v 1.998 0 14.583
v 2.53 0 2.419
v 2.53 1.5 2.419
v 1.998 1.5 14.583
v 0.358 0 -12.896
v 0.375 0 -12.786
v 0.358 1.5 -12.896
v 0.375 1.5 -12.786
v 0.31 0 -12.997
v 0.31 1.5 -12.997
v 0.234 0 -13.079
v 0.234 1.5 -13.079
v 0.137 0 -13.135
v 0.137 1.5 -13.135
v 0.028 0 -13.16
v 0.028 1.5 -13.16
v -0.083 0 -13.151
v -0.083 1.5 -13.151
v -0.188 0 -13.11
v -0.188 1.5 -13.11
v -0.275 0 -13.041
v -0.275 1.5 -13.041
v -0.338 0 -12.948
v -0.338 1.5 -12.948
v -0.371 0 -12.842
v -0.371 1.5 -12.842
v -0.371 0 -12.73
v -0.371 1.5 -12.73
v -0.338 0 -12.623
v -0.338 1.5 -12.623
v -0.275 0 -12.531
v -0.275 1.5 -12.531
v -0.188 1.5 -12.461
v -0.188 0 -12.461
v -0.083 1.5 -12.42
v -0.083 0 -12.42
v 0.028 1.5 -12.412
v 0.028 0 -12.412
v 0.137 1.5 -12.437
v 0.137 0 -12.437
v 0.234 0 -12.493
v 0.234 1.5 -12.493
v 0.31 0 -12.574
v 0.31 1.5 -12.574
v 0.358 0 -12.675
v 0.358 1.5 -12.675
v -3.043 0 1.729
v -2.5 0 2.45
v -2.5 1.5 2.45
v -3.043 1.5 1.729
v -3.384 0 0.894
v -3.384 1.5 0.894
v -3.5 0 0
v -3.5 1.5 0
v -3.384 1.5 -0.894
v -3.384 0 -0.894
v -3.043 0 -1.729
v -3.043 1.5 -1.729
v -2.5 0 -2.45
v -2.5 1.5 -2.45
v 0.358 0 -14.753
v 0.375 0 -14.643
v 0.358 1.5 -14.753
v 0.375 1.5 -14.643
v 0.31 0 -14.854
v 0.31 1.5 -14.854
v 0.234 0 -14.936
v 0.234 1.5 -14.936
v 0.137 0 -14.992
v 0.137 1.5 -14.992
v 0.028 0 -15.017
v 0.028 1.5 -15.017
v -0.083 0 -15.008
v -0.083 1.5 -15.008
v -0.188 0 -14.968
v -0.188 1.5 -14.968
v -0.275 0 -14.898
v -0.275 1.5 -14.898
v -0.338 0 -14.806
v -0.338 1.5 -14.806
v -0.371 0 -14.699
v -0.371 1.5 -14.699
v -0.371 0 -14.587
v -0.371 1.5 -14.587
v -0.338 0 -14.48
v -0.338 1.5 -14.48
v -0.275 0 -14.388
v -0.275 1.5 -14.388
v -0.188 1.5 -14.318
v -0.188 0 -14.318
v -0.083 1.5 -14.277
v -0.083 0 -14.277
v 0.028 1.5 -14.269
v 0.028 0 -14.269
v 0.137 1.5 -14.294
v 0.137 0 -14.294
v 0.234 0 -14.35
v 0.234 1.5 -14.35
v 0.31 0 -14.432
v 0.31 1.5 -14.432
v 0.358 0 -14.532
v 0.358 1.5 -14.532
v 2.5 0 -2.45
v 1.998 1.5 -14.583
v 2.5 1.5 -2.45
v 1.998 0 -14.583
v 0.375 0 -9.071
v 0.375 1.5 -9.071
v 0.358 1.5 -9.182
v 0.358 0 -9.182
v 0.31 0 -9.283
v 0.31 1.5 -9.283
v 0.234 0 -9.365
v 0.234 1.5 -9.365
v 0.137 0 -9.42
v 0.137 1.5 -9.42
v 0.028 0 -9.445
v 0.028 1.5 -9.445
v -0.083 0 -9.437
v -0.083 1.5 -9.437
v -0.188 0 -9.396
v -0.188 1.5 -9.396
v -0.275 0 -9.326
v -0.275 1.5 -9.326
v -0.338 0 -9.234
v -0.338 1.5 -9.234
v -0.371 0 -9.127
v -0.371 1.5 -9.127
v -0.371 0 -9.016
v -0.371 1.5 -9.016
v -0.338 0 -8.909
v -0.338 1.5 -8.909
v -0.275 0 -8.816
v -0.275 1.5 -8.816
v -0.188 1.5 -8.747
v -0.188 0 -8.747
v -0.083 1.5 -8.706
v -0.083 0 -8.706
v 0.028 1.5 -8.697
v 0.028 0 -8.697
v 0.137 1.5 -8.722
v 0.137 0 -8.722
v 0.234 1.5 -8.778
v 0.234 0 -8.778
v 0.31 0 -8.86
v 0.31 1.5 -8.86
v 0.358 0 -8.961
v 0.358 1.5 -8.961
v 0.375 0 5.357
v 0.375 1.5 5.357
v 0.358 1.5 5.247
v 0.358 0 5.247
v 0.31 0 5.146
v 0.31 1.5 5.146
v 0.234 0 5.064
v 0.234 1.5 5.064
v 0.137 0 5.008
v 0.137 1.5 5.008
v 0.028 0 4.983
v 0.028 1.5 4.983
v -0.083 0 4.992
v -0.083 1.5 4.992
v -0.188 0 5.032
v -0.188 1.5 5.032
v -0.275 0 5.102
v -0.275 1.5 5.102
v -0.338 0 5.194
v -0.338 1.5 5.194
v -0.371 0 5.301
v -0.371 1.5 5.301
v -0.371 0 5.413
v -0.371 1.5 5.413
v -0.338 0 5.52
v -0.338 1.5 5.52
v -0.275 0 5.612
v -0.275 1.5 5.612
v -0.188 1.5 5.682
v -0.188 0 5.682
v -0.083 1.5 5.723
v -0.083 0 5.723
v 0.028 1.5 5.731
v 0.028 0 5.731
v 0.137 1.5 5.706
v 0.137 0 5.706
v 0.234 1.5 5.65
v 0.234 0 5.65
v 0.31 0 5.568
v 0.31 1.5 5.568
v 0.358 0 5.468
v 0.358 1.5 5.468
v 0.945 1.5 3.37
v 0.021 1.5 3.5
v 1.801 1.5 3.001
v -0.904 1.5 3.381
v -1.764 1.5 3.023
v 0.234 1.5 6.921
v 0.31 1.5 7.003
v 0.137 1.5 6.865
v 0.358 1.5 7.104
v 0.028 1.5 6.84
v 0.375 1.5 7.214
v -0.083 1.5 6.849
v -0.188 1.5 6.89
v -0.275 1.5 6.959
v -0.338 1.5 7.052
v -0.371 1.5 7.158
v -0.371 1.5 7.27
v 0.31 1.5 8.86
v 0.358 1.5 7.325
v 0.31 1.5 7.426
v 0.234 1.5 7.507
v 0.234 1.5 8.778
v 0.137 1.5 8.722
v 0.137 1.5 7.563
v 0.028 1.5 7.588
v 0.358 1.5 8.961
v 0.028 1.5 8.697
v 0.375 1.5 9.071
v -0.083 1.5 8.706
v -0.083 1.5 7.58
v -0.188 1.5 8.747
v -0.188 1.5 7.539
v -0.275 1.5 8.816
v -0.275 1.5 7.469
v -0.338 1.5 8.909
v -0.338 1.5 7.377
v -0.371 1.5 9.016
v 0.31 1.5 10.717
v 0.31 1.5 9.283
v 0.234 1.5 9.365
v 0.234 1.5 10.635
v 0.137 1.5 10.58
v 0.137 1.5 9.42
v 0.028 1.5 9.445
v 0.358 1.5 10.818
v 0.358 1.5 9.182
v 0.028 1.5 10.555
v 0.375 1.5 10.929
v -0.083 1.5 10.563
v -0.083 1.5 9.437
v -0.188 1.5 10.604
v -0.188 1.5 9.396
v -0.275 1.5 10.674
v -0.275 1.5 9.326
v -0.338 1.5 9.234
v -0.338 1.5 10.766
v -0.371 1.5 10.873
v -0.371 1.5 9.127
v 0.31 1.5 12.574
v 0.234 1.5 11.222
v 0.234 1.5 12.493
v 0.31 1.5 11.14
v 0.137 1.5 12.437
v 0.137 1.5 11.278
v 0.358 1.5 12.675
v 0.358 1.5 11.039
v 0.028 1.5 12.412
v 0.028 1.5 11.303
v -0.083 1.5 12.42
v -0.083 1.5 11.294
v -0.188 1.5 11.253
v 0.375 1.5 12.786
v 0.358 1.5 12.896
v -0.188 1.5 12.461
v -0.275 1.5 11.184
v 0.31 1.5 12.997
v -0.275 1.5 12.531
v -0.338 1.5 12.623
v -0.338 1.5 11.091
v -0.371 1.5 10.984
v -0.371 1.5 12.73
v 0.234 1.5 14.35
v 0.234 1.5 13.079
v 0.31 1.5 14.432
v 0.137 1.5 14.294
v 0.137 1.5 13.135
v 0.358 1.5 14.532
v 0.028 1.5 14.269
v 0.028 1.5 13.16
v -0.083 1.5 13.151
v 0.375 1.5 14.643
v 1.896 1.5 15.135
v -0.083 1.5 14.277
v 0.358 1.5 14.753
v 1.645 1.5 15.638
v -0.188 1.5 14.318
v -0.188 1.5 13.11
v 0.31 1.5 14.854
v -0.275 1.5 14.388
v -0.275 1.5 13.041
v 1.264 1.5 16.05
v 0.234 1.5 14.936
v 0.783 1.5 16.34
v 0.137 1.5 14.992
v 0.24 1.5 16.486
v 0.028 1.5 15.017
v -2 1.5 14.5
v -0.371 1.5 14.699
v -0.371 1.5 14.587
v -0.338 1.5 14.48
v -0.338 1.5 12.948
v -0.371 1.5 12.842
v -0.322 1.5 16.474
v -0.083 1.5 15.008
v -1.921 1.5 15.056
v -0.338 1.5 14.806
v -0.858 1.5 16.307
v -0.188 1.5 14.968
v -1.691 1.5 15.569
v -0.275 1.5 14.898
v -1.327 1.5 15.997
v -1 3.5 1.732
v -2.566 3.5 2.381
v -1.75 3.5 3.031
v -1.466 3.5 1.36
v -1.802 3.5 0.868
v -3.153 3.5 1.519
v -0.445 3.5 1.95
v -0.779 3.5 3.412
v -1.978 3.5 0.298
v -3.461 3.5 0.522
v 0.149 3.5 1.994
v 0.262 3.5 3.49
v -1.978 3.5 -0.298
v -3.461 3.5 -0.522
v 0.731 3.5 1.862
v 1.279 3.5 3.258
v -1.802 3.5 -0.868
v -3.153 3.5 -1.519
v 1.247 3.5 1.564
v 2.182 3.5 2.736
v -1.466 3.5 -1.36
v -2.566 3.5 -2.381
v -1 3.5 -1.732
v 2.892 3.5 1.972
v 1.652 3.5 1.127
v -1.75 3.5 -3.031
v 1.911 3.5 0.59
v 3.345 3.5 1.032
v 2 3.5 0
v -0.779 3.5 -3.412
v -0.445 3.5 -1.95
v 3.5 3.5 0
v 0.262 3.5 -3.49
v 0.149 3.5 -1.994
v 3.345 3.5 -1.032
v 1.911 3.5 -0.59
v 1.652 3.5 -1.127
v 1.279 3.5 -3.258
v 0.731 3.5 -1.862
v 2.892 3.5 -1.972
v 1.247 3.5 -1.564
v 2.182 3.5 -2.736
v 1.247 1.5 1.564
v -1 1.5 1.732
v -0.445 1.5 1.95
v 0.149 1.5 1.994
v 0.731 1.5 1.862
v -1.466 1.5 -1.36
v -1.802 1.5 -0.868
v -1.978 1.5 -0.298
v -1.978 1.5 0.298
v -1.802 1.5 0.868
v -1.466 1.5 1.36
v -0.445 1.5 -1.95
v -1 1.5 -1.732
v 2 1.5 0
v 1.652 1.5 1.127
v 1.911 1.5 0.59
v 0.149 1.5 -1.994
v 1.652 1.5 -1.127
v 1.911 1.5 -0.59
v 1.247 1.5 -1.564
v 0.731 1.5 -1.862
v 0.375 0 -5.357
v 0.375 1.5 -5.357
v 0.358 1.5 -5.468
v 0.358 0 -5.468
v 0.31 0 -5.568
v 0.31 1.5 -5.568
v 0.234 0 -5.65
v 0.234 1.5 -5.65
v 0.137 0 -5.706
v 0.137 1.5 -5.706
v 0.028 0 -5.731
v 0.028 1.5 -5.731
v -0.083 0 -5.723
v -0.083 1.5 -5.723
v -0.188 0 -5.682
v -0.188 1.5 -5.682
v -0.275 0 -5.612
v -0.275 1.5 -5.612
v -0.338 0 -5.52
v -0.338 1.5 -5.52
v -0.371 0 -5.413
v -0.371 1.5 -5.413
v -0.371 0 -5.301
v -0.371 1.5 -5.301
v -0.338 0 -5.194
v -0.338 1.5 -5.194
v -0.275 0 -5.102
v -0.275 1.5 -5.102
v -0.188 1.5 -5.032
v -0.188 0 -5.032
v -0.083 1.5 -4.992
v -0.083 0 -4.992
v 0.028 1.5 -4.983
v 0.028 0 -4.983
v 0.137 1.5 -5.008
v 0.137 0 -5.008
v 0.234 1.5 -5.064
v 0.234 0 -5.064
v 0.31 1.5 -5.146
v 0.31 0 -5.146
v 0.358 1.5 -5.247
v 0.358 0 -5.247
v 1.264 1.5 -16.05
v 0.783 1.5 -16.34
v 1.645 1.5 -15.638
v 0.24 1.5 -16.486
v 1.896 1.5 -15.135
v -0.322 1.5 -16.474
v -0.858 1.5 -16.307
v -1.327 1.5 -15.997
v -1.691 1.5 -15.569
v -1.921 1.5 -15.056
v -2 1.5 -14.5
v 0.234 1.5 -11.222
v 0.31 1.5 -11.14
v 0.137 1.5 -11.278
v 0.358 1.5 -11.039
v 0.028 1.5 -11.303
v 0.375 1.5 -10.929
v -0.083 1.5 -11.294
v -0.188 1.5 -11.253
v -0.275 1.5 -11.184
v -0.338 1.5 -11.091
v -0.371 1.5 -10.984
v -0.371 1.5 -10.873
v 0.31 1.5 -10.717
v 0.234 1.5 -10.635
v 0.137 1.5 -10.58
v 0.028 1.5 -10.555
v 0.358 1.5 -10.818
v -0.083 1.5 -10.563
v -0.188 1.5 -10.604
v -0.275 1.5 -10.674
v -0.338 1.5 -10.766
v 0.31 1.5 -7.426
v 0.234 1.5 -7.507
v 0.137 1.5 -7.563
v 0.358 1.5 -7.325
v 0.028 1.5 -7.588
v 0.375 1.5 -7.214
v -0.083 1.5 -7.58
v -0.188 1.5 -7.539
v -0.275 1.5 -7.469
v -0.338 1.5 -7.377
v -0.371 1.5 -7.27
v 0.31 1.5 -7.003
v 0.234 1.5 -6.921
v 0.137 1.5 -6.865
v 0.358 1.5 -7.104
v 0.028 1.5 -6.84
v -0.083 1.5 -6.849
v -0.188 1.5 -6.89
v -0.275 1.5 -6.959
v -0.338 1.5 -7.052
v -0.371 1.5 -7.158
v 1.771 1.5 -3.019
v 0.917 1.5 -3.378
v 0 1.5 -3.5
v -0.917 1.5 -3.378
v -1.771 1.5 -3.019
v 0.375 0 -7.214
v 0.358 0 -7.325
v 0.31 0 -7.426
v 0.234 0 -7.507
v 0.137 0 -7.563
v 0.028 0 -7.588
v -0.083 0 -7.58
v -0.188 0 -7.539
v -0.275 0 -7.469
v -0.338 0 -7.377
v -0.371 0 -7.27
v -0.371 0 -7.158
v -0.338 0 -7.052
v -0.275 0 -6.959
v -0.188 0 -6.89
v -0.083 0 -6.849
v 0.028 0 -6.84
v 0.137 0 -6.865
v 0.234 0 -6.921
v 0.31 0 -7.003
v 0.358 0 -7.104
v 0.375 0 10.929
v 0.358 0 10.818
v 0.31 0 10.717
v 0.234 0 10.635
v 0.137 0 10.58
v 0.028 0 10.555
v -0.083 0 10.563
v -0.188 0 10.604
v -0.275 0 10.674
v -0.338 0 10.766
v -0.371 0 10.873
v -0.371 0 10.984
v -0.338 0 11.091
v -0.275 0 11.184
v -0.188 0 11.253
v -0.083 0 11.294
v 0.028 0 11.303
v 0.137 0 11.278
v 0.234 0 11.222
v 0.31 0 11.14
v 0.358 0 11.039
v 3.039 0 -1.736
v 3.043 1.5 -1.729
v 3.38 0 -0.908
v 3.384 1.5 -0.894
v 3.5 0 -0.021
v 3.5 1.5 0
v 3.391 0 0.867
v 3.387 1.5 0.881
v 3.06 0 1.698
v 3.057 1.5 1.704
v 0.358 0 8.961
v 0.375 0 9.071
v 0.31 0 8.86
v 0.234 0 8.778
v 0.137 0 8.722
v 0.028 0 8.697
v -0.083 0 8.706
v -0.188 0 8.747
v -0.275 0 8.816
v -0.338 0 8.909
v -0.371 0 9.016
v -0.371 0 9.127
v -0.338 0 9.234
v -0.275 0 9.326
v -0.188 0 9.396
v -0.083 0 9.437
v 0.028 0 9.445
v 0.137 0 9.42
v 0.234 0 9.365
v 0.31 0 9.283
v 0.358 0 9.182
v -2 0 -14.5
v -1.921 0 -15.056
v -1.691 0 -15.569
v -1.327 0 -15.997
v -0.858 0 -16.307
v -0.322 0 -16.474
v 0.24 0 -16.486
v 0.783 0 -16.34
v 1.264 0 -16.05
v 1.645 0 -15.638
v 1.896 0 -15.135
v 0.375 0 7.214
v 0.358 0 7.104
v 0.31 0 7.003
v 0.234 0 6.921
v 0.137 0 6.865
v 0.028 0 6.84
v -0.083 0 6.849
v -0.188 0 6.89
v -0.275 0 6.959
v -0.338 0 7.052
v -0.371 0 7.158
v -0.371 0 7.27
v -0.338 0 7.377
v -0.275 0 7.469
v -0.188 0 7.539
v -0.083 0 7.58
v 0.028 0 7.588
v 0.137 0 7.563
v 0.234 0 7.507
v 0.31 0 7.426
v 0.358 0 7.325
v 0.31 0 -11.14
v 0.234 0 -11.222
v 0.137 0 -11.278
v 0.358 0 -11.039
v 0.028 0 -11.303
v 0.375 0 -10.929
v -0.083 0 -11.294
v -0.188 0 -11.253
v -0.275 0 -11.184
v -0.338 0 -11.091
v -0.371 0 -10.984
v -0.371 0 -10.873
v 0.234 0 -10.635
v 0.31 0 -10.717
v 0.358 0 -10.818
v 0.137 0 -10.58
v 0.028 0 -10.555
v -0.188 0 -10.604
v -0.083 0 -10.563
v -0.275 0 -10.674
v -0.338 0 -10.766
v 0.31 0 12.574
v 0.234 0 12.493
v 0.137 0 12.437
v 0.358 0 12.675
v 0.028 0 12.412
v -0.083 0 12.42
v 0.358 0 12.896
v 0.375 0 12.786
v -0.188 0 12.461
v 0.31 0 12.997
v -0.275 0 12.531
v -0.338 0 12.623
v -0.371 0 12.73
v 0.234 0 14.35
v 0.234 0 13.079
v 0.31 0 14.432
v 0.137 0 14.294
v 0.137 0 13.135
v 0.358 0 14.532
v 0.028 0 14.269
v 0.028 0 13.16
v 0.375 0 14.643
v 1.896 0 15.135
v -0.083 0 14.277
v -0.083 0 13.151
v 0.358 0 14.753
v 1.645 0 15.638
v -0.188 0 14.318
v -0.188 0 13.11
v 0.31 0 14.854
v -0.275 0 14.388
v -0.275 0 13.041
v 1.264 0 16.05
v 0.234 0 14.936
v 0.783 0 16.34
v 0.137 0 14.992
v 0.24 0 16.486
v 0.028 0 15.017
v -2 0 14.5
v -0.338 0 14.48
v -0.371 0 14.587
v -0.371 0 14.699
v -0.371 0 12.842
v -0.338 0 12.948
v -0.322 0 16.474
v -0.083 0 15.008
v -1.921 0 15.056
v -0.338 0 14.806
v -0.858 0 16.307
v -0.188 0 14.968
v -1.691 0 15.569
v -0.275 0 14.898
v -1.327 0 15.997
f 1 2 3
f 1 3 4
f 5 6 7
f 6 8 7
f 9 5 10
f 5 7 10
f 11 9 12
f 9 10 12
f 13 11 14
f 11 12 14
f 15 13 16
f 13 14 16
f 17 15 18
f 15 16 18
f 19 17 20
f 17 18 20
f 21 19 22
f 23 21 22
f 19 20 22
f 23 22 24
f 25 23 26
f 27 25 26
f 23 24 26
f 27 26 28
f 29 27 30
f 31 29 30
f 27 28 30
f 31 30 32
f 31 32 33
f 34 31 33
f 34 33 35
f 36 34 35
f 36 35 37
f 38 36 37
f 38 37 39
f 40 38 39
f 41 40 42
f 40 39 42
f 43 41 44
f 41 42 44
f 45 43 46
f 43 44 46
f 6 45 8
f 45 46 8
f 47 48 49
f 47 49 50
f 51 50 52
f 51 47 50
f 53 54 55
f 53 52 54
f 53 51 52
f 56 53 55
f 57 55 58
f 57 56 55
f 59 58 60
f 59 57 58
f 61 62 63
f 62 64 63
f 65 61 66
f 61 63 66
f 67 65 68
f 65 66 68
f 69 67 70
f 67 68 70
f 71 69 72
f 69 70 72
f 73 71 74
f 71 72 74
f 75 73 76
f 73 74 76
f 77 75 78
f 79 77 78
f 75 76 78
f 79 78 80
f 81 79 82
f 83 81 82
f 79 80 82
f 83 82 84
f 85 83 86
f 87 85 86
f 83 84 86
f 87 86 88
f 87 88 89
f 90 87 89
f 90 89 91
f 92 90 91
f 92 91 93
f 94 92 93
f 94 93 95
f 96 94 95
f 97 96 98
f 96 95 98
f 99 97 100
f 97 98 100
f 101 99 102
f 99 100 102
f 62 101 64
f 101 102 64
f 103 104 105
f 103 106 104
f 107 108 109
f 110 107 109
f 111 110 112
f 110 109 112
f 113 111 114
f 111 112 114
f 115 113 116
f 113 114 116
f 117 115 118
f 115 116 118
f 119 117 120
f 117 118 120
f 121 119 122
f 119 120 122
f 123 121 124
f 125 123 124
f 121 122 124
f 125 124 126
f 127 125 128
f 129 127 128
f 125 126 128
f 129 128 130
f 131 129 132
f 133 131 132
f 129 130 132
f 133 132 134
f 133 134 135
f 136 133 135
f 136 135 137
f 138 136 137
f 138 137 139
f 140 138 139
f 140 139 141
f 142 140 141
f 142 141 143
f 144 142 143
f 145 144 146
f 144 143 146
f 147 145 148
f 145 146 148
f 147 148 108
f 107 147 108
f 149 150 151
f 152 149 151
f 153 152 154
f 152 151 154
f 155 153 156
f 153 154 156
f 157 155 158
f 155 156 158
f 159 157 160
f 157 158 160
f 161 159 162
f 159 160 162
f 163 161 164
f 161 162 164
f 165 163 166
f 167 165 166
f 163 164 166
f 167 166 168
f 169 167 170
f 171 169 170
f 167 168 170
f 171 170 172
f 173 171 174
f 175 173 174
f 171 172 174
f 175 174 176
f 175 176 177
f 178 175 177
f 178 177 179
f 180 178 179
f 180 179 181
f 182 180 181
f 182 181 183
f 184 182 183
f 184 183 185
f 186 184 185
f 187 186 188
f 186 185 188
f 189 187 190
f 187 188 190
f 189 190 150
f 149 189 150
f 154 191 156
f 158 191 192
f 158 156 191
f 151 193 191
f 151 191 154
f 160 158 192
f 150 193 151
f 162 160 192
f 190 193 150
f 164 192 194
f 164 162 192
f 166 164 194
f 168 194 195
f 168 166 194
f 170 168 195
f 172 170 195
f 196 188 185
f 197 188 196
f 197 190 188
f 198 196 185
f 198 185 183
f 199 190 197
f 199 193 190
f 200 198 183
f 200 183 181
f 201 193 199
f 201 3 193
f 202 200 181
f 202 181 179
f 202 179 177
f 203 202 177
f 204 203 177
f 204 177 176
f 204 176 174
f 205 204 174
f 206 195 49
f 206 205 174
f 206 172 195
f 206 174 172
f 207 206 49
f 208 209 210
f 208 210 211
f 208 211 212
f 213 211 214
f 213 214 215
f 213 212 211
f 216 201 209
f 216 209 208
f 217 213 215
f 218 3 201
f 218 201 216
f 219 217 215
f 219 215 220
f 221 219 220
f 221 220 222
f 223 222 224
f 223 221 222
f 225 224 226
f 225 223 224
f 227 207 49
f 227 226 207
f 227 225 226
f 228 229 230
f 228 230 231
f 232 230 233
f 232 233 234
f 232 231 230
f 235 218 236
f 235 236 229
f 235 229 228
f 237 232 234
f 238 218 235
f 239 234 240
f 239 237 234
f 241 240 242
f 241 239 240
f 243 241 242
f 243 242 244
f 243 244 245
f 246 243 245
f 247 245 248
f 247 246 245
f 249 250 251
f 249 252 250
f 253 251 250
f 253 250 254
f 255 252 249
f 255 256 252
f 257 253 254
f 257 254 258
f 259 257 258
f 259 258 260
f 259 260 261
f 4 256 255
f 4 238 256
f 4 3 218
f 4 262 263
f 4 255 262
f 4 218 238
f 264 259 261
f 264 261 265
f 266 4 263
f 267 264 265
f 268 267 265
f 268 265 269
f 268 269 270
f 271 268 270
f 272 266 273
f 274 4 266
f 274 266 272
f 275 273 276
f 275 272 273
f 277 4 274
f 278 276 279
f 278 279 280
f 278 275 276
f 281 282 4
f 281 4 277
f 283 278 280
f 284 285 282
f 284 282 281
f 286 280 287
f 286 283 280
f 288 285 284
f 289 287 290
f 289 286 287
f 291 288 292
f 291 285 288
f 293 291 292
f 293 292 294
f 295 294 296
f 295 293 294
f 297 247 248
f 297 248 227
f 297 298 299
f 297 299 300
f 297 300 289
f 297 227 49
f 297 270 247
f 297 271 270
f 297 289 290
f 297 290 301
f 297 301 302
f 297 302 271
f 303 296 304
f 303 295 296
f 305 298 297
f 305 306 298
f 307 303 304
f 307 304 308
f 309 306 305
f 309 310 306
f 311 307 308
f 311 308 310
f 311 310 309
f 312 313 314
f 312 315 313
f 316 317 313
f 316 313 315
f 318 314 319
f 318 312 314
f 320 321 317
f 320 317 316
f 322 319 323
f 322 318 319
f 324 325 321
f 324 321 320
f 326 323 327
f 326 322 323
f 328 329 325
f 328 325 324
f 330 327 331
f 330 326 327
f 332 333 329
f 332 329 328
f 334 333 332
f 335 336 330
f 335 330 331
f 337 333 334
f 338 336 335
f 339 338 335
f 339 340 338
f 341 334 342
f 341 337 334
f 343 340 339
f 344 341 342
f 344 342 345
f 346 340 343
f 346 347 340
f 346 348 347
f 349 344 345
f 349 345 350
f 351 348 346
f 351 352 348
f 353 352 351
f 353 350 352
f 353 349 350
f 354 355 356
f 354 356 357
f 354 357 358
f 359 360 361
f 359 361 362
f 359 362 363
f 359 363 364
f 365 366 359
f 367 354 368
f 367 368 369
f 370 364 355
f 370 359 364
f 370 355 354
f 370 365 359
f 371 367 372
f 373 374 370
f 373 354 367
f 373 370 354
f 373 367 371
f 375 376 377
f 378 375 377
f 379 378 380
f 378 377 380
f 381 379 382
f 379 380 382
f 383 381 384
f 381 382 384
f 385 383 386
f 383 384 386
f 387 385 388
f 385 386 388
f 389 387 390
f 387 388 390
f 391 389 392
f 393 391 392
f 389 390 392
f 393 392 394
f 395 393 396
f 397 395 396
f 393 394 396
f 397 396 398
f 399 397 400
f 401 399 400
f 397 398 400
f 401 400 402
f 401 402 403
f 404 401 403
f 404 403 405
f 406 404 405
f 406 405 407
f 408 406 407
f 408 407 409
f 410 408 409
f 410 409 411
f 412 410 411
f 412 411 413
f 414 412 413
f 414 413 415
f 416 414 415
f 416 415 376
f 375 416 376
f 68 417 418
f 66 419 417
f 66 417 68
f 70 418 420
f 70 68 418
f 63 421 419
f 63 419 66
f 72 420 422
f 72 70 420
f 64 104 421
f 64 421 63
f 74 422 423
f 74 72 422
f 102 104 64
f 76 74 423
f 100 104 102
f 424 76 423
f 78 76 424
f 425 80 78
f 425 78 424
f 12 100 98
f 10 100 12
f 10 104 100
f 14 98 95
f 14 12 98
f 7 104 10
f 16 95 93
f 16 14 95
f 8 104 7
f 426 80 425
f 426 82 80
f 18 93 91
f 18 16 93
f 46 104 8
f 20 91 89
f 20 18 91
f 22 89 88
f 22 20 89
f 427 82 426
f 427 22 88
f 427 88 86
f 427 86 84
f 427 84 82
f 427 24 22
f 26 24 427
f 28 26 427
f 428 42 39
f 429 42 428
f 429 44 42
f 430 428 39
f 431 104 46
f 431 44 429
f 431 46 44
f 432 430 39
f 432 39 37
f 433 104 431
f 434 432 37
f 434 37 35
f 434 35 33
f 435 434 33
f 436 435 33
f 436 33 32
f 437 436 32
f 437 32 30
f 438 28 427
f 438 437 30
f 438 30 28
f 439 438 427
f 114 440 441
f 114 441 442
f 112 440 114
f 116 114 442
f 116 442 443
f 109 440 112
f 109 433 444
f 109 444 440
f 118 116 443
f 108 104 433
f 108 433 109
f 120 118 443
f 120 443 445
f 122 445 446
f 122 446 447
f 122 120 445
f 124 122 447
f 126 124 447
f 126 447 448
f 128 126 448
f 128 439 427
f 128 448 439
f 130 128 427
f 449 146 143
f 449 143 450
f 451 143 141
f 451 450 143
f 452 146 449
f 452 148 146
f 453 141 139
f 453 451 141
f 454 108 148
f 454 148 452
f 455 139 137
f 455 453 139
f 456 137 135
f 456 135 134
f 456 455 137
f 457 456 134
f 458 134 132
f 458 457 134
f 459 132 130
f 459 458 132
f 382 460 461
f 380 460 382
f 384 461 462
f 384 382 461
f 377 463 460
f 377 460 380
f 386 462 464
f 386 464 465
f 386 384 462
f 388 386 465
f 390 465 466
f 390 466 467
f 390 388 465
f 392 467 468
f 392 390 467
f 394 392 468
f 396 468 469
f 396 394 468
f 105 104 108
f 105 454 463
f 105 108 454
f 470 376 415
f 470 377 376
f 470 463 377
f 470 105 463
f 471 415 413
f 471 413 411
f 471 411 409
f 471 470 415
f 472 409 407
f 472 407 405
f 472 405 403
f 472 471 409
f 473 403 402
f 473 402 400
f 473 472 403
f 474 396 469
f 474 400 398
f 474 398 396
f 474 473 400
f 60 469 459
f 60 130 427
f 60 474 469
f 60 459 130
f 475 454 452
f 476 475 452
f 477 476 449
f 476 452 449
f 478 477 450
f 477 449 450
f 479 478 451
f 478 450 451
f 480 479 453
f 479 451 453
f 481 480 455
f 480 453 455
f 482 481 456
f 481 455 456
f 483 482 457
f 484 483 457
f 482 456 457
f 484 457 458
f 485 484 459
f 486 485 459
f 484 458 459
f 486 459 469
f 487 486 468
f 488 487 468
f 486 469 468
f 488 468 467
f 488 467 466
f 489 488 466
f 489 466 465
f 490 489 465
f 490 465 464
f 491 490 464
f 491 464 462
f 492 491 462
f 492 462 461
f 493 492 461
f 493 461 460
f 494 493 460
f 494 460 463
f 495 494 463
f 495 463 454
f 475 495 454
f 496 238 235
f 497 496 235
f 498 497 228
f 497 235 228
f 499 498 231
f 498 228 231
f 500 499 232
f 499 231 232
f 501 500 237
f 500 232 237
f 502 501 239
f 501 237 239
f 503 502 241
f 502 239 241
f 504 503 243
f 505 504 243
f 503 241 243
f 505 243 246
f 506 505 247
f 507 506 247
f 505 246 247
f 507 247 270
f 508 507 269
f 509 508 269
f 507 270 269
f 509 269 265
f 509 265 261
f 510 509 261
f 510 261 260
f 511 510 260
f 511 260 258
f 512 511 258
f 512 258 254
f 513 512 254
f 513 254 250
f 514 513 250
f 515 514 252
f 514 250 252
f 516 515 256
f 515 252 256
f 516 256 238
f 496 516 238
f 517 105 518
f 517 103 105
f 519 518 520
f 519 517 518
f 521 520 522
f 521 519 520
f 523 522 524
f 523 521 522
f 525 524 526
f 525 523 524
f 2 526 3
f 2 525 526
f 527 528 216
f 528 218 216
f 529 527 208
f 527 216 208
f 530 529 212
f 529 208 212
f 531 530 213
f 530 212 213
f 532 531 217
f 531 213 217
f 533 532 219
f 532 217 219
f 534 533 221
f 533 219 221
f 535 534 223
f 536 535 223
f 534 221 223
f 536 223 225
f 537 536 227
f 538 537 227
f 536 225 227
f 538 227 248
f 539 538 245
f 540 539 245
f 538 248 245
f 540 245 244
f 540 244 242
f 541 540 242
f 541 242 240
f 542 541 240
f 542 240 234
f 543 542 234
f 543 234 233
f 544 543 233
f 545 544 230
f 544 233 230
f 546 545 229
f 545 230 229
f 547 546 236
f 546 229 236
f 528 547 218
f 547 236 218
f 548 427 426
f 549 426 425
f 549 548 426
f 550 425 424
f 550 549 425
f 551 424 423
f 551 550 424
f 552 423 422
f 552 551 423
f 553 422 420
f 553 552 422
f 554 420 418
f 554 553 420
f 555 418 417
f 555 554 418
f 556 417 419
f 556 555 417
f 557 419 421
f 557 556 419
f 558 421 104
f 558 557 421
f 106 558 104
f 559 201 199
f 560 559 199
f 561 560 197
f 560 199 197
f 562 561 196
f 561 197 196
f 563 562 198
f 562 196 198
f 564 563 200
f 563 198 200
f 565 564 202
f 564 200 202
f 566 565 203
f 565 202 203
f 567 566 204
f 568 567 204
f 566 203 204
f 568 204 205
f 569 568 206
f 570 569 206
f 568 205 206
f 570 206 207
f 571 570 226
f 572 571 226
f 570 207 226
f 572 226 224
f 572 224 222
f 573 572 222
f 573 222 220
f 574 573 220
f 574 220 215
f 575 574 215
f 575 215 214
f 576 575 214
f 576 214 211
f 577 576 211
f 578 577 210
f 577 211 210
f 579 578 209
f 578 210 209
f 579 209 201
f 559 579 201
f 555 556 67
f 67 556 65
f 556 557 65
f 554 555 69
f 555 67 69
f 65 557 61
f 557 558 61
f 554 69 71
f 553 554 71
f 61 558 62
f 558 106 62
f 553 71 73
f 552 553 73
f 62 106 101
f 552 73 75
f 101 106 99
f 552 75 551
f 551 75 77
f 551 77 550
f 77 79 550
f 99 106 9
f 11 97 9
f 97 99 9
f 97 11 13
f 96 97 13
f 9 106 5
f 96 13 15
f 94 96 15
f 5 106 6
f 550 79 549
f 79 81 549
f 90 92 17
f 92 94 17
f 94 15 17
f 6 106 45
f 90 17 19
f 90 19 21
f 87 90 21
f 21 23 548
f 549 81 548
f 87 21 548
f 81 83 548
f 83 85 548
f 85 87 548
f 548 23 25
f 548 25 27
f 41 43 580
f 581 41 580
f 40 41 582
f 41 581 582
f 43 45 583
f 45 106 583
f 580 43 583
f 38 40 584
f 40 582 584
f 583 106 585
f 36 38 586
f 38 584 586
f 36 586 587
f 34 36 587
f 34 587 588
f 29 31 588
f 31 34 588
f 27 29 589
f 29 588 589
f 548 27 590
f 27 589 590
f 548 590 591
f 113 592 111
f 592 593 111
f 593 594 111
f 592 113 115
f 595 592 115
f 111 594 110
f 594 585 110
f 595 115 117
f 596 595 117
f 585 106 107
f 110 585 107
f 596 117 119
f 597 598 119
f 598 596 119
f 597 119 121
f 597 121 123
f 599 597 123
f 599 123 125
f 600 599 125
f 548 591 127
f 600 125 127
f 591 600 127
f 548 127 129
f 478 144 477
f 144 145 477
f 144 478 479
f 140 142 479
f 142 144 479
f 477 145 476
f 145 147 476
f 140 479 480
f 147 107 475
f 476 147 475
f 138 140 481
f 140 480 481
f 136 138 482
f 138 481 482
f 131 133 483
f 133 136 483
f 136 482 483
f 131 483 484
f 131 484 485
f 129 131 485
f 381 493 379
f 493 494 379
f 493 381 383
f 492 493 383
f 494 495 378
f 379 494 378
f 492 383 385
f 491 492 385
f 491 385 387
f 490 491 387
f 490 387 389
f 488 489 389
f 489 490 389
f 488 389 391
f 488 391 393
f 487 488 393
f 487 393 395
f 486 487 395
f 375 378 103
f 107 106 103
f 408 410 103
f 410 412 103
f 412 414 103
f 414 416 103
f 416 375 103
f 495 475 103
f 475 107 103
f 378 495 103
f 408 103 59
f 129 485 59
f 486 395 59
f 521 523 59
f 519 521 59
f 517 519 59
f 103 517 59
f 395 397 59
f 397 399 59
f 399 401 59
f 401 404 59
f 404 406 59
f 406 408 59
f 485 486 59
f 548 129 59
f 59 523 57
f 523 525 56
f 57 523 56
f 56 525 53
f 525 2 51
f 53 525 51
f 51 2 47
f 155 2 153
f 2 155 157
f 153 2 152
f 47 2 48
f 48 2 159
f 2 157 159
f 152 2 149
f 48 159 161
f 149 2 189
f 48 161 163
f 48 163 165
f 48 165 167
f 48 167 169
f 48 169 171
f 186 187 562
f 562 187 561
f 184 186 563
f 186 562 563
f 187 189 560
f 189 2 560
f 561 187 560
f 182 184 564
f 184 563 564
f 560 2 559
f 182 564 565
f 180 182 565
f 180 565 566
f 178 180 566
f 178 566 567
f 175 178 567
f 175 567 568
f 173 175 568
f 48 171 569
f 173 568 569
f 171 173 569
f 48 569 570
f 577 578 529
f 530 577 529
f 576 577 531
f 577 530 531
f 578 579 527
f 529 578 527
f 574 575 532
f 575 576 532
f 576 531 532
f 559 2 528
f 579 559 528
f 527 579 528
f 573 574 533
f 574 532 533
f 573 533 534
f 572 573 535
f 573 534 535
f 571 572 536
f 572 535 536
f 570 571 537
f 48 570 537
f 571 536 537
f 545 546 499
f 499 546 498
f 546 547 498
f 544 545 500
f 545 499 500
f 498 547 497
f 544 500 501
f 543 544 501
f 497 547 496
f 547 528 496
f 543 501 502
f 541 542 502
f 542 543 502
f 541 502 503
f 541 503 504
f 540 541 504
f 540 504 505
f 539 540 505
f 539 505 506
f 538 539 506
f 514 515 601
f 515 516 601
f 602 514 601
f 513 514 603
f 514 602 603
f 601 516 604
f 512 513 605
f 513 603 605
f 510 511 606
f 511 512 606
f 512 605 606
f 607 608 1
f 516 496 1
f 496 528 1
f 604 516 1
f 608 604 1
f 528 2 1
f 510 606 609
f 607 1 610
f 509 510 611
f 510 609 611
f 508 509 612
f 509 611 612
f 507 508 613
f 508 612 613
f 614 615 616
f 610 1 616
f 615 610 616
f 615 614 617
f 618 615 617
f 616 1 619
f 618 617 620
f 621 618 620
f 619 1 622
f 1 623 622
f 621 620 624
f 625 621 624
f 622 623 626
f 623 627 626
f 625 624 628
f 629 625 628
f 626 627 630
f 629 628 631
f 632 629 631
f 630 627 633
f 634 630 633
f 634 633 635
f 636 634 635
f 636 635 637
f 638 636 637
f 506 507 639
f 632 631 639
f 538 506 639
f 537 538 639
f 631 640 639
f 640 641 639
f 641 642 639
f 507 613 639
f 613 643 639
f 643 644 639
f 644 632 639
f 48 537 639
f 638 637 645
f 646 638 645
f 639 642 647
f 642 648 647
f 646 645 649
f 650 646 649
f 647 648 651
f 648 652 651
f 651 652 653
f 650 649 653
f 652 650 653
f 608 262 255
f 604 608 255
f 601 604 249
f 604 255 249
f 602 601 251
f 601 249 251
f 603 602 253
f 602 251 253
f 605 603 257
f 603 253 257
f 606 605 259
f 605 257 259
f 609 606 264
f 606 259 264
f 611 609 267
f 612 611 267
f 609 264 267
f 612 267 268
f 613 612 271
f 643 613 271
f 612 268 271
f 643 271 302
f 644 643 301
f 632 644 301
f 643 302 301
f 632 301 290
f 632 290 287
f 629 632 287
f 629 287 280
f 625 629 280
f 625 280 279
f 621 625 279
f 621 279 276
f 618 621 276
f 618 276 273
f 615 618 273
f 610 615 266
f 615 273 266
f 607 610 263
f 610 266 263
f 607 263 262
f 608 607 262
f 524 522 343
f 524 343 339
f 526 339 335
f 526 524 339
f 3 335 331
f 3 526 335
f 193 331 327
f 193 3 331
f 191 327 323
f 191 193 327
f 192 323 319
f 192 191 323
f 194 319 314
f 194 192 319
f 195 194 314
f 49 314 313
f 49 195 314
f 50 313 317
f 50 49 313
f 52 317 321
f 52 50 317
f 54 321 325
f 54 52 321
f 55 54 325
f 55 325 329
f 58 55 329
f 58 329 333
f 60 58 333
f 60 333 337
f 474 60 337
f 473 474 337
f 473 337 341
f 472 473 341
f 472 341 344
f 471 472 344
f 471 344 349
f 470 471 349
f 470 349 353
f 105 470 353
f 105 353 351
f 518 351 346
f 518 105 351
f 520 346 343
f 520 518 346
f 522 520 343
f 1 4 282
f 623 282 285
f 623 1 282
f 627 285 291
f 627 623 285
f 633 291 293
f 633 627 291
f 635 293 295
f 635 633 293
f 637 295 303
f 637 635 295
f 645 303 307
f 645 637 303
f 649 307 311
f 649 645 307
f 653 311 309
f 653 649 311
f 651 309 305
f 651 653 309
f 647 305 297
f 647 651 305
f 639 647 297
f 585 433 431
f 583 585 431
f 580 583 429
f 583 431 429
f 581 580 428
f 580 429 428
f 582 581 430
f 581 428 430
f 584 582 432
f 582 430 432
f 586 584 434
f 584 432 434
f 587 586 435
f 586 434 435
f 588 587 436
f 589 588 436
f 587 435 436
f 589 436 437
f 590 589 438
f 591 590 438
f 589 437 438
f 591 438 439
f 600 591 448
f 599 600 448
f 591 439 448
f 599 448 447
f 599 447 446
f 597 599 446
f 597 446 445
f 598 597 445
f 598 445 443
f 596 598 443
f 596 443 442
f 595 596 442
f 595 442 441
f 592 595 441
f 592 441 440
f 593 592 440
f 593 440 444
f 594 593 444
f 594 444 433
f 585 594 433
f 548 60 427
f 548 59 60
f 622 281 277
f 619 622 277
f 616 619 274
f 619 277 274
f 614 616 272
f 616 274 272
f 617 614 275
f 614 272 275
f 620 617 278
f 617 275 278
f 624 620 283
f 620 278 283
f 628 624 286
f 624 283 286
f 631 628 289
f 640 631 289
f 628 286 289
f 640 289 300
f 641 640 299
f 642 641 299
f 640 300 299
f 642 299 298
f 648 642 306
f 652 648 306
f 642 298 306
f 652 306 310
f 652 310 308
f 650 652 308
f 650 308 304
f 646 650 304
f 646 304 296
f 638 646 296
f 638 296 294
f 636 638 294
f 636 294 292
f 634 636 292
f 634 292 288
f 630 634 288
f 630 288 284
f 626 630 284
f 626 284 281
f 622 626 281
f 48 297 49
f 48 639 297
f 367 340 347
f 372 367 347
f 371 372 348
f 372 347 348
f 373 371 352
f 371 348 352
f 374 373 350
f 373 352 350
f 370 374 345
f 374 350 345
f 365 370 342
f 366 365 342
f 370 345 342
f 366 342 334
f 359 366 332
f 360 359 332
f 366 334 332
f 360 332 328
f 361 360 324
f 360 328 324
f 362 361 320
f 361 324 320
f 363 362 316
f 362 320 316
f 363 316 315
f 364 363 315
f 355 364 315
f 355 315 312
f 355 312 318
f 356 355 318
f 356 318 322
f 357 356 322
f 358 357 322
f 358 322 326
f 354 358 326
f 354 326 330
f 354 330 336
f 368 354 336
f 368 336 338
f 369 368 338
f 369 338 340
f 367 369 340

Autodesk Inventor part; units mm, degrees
ref_plane "YZ Plane" through (0, 0, 0) normal (1, 0, 0) x (0, 1, 0)
ref_plane "XZ Plane" through (0, 0, 0) normal (0, 1, 0) x (-1, 0, 0)
ref_plane "XY Plane" through (0, 0, 0) normal (0, 0, 1) x (1, 0, 0)
sketch "Sketch1" plane through (0, 0, 0) normal (0, 1, 0) x (-1, 0, 0)
  line L0 (0, 0) -> (0, -16.5)
  line L1 (0, -16.5) -> (0, 16.5)
  circle A0 centre (0, -14.5) radius 2
  circle A1 centre (0, 14.5) radius 2
  line L2 (3.5, 0) -> (2.5, 0)
  line L3 (2, 14.5) -> (2.5, 2.4495)
  line L4 (2.5, -2.4495) -> (1.9983, -14.5826)
  line L5 (-1.9983, -14.5826) -> (-2.5, -2.4495)
  line L6 (-2.5299, 2.4186) -> (-1.9983, 14.5826)
  arc A2 (2.5, -2.4495) -> (2.5, 2.4495) centre (0, 0) ccw
  arc A3 (-2.5299, 2.4186) -> (-2.5, -2.4495) centre (0, 0) ccw
  dimension "d2" = 33
  dimension "d3" = 4
  dimension "d4" = 4
  dimension "d5" = 2
  dimension "d6" = 2
  dimension "d7" = 1
extrude "Extrusion1" add sketch "Sketch1" along normal blind 1.5
sketch "Sketch2" plane through (0, 1.5, 0) normal (0, 1, 0) x (1, 0, 0)
  circle A0 centre (0, 0) radius 3.5
extrude "Extrusion2" add sketch "Sketch2" along normal blind 2
sketch "Sketch3" plane through (0, 3.5, 0) normal (0, 1, 0) x (1, 0, 0)
  circle A0 centre (0, 0) radius 2
  dimension "d13" = 4
extrude "Extrusion3" cut sketch "Sketch3" against normal blind 2
sketch "Sketch4" plane through (0, 1.5, 0) normal (0, 1, 0) x (1, 0, 0)
  circle A0 centre (0, 5.3571) radius 0.375
  circle A1 centre (0, 7.2143) radius 0.375
  circle A2 centre (0, 9.0714) radius 0.375
  circle A3 centre (0, 10.9286) radius 0.375
  circle A4 centre (0, 12.7857) radius 0.375
  circle A5 centre (0, 14.6429) radius 0.375
  arc A6 (2.5, 2.4495) -> (-2.5, 2.4495) centre (0, 0) ccw projected
  dimension "d16" = 0.75
  dimension "d17" = 0.75
  dimension "d18" = 0.75
  dimension "d19" = 0.75
  dimension "d20" = 0.75
  dimension "d21" = 0.75
  dimension "d22" = 1.8571
  dimension "d23" = 5.3571
  dimension "d24" = 1.8571
  dimension "d25" = 1.8571
  dimension "d26" = 1.8571
  dimension "d27" = 1.8571
extrude "Extrusion4" cut sketch "Sketch4" against normal blind 2
mirror "Mirror1" about plane through (0, 0, 0) normal (0, 0, 1) of "Extrusion4"
properties part number "Micro Servo 9g Arm"
